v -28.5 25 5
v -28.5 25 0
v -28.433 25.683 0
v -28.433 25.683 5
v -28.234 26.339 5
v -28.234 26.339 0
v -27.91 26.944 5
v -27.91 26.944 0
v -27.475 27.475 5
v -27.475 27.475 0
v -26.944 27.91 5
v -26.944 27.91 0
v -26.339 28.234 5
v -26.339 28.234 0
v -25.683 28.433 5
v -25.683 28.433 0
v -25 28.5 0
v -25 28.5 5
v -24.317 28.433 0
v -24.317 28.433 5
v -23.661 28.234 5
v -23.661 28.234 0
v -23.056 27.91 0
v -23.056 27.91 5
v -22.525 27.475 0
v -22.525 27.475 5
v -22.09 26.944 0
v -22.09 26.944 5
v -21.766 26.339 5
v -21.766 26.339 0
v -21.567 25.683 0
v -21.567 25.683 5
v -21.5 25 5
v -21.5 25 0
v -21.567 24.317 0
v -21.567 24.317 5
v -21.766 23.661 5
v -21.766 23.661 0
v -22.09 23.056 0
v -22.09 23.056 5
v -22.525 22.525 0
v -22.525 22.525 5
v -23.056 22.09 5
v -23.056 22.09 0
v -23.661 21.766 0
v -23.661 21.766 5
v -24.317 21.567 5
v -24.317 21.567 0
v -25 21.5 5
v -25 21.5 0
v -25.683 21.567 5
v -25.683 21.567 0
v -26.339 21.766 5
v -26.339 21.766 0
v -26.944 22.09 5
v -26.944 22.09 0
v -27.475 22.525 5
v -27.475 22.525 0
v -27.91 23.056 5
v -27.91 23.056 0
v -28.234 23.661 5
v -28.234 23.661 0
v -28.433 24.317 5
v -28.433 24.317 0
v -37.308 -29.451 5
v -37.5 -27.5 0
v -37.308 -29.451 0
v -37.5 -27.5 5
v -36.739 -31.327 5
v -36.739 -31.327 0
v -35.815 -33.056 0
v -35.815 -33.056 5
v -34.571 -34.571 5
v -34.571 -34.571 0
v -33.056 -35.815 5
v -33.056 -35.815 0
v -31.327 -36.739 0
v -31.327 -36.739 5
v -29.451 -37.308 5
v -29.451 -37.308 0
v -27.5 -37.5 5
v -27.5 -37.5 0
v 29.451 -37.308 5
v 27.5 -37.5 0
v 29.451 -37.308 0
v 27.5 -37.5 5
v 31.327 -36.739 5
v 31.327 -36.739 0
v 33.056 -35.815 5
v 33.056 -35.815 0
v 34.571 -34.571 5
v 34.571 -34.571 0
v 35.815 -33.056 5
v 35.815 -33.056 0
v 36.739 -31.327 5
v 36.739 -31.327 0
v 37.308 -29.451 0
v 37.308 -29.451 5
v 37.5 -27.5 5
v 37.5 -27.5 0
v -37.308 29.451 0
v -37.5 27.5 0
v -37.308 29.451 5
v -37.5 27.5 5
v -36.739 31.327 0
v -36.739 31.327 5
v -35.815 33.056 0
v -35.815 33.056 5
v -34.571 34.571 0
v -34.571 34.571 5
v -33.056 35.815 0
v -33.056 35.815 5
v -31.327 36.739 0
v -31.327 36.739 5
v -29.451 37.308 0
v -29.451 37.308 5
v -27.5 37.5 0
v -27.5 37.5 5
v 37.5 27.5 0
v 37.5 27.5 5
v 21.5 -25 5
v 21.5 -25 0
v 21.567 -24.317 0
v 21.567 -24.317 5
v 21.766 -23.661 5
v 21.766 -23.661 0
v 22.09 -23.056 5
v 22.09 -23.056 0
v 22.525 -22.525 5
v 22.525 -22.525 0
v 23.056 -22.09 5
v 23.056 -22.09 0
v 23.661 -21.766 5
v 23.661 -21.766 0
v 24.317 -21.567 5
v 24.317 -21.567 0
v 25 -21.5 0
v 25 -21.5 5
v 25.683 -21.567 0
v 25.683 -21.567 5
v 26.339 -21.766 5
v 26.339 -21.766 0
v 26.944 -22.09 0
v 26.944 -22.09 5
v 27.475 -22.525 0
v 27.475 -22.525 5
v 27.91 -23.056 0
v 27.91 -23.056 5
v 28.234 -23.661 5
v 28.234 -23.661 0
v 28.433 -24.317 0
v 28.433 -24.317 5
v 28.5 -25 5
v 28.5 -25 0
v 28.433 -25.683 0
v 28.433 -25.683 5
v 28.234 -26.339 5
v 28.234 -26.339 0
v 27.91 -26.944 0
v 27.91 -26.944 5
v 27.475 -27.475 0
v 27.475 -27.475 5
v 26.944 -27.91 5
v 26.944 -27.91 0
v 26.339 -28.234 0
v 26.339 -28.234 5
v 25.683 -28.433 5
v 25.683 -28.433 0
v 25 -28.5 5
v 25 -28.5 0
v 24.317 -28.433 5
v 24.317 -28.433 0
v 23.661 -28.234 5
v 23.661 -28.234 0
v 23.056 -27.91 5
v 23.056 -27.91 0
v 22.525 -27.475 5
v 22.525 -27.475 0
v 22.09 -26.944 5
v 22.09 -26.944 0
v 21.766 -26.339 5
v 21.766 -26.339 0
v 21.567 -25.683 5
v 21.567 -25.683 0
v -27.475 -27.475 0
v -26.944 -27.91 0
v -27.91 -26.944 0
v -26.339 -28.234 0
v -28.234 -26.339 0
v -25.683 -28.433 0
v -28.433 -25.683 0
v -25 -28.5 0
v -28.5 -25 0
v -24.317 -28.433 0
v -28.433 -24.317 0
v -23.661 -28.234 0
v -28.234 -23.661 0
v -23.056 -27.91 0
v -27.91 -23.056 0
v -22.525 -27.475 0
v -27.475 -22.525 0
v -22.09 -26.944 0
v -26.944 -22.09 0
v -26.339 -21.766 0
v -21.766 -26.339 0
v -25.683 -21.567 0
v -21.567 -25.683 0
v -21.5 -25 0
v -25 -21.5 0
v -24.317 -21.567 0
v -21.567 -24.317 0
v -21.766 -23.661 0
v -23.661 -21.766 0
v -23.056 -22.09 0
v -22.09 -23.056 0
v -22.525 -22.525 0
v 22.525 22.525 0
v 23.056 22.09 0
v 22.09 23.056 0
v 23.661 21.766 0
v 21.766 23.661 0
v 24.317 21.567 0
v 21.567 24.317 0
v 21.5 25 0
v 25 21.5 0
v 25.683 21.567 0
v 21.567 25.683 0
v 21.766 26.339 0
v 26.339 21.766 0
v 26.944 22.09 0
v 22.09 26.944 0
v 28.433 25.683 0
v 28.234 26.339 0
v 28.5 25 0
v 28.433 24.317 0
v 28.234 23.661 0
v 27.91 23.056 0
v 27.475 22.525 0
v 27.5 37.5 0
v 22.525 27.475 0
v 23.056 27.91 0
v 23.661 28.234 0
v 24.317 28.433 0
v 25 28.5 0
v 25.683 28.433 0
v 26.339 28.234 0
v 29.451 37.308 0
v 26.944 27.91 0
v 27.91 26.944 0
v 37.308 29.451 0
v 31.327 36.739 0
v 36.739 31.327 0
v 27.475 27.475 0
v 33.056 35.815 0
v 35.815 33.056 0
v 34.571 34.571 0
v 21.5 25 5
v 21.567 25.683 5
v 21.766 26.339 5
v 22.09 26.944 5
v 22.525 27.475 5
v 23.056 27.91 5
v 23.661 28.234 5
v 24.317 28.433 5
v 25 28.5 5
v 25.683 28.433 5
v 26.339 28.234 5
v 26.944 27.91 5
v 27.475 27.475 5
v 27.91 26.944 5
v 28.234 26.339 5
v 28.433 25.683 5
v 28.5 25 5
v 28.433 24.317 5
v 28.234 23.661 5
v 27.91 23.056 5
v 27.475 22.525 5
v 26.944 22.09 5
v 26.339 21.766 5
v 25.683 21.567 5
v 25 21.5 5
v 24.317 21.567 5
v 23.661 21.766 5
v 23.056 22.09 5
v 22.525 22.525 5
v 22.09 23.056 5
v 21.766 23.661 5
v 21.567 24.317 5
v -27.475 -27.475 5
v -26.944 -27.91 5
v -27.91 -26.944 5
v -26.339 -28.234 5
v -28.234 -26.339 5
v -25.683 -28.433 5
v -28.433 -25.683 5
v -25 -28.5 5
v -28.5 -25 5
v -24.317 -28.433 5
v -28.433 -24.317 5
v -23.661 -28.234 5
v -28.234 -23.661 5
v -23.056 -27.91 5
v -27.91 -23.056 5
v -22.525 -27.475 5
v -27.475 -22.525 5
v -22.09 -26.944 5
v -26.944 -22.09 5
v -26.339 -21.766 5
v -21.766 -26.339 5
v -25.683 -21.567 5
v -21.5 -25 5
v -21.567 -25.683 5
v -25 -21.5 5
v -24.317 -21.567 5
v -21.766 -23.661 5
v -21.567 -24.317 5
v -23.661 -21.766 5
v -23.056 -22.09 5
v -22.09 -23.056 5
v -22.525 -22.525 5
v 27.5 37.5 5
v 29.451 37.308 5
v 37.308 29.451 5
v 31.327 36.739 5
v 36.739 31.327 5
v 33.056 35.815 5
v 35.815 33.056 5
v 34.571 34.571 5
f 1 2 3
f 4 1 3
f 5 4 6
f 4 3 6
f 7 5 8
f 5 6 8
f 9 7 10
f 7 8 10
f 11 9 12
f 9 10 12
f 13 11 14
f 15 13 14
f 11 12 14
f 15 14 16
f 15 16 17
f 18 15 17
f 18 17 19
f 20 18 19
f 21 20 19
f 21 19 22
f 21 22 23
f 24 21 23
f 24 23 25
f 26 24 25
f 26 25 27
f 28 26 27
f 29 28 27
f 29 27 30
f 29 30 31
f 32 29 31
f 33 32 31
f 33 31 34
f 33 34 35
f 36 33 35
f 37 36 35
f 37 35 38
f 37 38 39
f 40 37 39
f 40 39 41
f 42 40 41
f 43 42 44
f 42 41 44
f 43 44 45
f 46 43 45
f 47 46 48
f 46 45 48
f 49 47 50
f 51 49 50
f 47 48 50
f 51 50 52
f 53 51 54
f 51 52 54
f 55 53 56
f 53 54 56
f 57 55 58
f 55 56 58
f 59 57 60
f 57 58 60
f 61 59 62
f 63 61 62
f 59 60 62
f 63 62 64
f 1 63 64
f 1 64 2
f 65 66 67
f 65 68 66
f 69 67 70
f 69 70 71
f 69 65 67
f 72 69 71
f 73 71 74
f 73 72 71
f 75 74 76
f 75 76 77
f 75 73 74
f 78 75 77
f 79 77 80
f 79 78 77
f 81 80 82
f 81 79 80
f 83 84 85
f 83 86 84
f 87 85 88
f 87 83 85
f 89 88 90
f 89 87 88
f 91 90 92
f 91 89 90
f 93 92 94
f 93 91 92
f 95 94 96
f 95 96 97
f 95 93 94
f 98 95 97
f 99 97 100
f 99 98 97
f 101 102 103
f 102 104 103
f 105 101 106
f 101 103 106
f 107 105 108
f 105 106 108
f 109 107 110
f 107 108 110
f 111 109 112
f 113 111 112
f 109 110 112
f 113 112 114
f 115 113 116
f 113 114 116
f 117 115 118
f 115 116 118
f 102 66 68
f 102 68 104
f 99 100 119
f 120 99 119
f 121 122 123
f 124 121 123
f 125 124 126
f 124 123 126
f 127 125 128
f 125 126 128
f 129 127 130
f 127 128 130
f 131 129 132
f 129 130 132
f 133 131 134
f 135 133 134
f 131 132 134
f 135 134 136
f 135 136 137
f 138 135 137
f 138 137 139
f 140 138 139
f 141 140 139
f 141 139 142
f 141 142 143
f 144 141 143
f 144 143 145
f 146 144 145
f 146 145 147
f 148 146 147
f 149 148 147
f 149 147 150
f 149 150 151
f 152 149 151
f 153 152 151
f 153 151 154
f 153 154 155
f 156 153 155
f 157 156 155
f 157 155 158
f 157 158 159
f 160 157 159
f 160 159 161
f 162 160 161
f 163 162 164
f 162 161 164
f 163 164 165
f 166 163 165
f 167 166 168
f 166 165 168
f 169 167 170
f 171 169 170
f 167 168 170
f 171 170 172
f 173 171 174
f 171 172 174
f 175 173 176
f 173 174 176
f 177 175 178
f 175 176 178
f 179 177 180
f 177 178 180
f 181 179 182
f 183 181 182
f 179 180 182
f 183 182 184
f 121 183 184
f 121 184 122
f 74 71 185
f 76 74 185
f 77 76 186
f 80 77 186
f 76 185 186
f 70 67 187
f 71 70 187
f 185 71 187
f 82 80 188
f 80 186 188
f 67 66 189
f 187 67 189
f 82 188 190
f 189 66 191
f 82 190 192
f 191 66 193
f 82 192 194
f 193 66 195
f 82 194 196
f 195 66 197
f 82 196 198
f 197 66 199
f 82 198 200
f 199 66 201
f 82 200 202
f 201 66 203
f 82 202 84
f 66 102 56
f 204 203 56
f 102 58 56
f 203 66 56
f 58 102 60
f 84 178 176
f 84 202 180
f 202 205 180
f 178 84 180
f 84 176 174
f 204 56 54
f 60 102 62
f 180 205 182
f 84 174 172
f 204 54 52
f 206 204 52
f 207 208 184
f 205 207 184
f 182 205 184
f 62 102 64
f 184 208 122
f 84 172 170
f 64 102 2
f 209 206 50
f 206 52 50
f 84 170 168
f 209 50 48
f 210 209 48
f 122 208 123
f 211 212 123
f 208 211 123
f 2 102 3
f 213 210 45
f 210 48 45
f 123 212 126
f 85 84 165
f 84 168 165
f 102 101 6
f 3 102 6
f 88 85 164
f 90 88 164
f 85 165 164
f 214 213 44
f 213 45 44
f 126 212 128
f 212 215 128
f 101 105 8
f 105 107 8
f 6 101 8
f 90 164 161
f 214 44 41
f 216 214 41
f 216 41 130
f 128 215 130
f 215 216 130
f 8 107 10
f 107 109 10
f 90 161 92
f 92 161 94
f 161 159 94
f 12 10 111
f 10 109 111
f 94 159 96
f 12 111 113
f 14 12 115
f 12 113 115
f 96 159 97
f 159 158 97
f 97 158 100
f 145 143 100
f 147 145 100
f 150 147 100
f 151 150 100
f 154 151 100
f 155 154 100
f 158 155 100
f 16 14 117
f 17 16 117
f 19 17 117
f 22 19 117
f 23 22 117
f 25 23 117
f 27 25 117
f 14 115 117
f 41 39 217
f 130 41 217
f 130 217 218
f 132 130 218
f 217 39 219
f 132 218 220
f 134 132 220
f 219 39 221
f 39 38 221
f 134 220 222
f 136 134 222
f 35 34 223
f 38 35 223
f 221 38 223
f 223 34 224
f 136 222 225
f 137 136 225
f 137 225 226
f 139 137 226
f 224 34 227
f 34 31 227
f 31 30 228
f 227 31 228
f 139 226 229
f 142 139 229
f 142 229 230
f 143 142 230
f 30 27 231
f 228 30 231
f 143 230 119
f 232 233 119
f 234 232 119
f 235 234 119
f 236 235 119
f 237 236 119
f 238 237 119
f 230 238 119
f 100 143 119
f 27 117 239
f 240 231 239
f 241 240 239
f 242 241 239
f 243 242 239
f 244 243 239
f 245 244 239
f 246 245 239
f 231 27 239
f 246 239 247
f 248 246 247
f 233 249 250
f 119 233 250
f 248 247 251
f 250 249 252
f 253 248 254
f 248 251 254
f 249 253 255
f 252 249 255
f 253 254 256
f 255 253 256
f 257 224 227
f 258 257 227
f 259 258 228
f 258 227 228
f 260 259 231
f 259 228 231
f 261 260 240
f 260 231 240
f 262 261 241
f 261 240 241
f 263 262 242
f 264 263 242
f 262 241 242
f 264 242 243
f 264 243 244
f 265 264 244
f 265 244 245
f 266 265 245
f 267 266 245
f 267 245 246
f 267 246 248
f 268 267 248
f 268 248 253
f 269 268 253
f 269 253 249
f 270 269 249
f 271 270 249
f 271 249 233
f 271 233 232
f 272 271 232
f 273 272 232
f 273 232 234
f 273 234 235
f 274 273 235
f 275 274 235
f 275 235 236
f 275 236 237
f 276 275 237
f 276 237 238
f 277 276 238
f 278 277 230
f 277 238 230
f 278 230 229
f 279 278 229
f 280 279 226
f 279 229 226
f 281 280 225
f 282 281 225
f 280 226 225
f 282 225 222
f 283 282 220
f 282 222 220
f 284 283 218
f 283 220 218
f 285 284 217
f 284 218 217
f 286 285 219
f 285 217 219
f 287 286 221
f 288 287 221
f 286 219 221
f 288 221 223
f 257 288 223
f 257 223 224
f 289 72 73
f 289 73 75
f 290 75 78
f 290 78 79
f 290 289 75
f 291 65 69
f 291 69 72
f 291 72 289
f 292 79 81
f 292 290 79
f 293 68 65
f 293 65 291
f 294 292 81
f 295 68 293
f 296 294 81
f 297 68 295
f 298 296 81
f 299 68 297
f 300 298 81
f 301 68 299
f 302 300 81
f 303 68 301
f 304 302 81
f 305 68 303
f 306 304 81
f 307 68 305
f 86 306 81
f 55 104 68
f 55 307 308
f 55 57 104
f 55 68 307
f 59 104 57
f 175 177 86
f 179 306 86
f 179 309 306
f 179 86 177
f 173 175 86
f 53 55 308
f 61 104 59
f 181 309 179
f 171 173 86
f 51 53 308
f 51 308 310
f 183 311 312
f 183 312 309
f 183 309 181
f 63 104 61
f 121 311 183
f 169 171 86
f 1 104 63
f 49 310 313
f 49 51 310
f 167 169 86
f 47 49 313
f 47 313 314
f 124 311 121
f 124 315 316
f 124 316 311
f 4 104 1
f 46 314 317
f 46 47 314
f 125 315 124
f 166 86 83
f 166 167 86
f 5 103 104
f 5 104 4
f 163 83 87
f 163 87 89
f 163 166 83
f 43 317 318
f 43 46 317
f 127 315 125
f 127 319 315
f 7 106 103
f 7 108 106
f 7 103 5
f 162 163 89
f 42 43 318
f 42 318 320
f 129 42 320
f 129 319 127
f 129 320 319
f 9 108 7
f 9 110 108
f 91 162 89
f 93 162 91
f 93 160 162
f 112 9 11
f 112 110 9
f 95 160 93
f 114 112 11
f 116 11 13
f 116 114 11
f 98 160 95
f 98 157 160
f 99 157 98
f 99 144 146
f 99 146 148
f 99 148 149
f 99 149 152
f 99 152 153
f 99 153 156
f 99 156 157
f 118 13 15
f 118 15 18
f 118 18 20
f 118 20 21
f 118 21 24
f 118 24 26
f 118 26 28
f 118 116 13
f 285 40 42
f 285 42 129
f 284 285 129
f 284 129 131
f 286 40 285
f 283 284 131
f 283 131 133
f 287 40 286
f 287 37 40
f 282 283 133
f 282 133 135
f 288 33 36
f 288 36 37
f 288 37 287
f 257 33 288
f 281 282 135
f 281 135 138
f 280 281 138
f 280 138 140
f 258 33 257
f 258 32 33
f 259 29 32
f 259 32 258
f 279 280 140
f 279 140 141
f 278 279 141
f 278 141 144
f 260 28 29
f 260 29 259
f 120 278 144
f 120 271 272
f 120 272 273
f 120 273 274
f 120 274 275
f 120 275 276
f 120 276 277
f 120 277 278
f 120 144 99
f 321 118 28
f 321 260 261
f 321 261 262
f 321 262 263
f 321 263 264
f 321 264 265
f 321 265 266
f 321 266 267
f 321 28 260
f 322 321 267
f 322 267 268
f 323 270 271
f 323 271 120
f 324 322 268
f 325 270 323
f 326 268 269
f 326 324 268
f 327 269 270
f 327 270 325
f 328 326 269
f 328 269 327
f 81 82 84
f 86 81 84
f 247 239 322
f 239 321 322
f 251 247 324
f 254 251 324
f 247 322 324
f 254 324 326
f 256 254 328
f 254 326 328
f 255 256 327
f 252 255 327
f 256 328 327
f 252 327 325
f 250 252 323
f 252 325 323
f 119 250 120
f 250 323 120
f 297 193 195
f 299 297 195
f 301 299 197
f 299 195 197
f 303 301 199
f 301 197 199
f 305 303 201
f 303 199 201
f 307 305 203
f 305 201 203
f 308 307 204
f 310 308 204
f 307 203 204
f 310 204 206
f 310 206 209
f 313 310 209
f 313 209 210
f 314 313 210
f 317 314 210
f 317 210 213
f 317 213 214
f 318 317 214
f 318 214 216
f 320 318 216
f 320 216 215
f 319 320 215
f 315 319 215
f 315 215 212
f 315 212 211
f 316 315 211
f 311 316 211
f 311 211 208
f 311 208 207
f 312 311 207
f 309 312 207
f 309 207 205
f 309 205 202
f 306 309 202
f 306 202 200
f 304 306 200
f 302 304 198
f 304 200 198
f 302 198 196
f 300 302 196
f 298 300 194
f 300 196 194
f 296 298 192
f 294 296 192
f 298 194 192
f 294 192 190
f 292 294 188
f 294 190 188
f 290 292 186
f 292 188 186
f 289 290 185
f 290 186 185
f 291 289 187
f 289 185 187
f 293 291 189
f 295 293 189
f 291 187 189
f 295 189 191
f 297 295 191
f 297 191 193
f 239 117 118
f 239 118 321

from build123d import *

# Parameters (mm, degrees)
SKETCH1_W                = 75
SKETCH1_H                = 75
BOSS_EXTRUDE1_DEPTH      = 5
F_7_0_7_DIAMETER_HOLE1_D = 7
FILLET1_R                = 10


with BuildPart() as part:
    # Sketch1 → Boss-Extrude1 (new body)
    with BuildSketch(Plane.XY):
        Rectangle(SKETCH1_W, SKETCH1_H)
    extrude(amount=BOSS_EXTRUDE1_DEPTH)

    # Ø7.0 (7) Diameter Hole1 (through all)
    with Locations(Plane.XY.offset(5)):
        with Locations((-25, 25), (-25, -25), (25, -25), (25, 25)):
            Hole(F_7_0_7_DIAMETER_HOLE1_D / 2)

    # Fillet1
    fillet1_edges = [part.edges().sort_by_distance(p)[0] for p in [
        (-37.5, 37.5, 2.5),
        (37.5, 37.5, 2.5),
        (37.5, -37.5, 2.5),
        (-37.5, -37.5, 2.5),
    ]]
    fillet(fillet1_edges, radius=FILLET1_R)


solid = part.part
